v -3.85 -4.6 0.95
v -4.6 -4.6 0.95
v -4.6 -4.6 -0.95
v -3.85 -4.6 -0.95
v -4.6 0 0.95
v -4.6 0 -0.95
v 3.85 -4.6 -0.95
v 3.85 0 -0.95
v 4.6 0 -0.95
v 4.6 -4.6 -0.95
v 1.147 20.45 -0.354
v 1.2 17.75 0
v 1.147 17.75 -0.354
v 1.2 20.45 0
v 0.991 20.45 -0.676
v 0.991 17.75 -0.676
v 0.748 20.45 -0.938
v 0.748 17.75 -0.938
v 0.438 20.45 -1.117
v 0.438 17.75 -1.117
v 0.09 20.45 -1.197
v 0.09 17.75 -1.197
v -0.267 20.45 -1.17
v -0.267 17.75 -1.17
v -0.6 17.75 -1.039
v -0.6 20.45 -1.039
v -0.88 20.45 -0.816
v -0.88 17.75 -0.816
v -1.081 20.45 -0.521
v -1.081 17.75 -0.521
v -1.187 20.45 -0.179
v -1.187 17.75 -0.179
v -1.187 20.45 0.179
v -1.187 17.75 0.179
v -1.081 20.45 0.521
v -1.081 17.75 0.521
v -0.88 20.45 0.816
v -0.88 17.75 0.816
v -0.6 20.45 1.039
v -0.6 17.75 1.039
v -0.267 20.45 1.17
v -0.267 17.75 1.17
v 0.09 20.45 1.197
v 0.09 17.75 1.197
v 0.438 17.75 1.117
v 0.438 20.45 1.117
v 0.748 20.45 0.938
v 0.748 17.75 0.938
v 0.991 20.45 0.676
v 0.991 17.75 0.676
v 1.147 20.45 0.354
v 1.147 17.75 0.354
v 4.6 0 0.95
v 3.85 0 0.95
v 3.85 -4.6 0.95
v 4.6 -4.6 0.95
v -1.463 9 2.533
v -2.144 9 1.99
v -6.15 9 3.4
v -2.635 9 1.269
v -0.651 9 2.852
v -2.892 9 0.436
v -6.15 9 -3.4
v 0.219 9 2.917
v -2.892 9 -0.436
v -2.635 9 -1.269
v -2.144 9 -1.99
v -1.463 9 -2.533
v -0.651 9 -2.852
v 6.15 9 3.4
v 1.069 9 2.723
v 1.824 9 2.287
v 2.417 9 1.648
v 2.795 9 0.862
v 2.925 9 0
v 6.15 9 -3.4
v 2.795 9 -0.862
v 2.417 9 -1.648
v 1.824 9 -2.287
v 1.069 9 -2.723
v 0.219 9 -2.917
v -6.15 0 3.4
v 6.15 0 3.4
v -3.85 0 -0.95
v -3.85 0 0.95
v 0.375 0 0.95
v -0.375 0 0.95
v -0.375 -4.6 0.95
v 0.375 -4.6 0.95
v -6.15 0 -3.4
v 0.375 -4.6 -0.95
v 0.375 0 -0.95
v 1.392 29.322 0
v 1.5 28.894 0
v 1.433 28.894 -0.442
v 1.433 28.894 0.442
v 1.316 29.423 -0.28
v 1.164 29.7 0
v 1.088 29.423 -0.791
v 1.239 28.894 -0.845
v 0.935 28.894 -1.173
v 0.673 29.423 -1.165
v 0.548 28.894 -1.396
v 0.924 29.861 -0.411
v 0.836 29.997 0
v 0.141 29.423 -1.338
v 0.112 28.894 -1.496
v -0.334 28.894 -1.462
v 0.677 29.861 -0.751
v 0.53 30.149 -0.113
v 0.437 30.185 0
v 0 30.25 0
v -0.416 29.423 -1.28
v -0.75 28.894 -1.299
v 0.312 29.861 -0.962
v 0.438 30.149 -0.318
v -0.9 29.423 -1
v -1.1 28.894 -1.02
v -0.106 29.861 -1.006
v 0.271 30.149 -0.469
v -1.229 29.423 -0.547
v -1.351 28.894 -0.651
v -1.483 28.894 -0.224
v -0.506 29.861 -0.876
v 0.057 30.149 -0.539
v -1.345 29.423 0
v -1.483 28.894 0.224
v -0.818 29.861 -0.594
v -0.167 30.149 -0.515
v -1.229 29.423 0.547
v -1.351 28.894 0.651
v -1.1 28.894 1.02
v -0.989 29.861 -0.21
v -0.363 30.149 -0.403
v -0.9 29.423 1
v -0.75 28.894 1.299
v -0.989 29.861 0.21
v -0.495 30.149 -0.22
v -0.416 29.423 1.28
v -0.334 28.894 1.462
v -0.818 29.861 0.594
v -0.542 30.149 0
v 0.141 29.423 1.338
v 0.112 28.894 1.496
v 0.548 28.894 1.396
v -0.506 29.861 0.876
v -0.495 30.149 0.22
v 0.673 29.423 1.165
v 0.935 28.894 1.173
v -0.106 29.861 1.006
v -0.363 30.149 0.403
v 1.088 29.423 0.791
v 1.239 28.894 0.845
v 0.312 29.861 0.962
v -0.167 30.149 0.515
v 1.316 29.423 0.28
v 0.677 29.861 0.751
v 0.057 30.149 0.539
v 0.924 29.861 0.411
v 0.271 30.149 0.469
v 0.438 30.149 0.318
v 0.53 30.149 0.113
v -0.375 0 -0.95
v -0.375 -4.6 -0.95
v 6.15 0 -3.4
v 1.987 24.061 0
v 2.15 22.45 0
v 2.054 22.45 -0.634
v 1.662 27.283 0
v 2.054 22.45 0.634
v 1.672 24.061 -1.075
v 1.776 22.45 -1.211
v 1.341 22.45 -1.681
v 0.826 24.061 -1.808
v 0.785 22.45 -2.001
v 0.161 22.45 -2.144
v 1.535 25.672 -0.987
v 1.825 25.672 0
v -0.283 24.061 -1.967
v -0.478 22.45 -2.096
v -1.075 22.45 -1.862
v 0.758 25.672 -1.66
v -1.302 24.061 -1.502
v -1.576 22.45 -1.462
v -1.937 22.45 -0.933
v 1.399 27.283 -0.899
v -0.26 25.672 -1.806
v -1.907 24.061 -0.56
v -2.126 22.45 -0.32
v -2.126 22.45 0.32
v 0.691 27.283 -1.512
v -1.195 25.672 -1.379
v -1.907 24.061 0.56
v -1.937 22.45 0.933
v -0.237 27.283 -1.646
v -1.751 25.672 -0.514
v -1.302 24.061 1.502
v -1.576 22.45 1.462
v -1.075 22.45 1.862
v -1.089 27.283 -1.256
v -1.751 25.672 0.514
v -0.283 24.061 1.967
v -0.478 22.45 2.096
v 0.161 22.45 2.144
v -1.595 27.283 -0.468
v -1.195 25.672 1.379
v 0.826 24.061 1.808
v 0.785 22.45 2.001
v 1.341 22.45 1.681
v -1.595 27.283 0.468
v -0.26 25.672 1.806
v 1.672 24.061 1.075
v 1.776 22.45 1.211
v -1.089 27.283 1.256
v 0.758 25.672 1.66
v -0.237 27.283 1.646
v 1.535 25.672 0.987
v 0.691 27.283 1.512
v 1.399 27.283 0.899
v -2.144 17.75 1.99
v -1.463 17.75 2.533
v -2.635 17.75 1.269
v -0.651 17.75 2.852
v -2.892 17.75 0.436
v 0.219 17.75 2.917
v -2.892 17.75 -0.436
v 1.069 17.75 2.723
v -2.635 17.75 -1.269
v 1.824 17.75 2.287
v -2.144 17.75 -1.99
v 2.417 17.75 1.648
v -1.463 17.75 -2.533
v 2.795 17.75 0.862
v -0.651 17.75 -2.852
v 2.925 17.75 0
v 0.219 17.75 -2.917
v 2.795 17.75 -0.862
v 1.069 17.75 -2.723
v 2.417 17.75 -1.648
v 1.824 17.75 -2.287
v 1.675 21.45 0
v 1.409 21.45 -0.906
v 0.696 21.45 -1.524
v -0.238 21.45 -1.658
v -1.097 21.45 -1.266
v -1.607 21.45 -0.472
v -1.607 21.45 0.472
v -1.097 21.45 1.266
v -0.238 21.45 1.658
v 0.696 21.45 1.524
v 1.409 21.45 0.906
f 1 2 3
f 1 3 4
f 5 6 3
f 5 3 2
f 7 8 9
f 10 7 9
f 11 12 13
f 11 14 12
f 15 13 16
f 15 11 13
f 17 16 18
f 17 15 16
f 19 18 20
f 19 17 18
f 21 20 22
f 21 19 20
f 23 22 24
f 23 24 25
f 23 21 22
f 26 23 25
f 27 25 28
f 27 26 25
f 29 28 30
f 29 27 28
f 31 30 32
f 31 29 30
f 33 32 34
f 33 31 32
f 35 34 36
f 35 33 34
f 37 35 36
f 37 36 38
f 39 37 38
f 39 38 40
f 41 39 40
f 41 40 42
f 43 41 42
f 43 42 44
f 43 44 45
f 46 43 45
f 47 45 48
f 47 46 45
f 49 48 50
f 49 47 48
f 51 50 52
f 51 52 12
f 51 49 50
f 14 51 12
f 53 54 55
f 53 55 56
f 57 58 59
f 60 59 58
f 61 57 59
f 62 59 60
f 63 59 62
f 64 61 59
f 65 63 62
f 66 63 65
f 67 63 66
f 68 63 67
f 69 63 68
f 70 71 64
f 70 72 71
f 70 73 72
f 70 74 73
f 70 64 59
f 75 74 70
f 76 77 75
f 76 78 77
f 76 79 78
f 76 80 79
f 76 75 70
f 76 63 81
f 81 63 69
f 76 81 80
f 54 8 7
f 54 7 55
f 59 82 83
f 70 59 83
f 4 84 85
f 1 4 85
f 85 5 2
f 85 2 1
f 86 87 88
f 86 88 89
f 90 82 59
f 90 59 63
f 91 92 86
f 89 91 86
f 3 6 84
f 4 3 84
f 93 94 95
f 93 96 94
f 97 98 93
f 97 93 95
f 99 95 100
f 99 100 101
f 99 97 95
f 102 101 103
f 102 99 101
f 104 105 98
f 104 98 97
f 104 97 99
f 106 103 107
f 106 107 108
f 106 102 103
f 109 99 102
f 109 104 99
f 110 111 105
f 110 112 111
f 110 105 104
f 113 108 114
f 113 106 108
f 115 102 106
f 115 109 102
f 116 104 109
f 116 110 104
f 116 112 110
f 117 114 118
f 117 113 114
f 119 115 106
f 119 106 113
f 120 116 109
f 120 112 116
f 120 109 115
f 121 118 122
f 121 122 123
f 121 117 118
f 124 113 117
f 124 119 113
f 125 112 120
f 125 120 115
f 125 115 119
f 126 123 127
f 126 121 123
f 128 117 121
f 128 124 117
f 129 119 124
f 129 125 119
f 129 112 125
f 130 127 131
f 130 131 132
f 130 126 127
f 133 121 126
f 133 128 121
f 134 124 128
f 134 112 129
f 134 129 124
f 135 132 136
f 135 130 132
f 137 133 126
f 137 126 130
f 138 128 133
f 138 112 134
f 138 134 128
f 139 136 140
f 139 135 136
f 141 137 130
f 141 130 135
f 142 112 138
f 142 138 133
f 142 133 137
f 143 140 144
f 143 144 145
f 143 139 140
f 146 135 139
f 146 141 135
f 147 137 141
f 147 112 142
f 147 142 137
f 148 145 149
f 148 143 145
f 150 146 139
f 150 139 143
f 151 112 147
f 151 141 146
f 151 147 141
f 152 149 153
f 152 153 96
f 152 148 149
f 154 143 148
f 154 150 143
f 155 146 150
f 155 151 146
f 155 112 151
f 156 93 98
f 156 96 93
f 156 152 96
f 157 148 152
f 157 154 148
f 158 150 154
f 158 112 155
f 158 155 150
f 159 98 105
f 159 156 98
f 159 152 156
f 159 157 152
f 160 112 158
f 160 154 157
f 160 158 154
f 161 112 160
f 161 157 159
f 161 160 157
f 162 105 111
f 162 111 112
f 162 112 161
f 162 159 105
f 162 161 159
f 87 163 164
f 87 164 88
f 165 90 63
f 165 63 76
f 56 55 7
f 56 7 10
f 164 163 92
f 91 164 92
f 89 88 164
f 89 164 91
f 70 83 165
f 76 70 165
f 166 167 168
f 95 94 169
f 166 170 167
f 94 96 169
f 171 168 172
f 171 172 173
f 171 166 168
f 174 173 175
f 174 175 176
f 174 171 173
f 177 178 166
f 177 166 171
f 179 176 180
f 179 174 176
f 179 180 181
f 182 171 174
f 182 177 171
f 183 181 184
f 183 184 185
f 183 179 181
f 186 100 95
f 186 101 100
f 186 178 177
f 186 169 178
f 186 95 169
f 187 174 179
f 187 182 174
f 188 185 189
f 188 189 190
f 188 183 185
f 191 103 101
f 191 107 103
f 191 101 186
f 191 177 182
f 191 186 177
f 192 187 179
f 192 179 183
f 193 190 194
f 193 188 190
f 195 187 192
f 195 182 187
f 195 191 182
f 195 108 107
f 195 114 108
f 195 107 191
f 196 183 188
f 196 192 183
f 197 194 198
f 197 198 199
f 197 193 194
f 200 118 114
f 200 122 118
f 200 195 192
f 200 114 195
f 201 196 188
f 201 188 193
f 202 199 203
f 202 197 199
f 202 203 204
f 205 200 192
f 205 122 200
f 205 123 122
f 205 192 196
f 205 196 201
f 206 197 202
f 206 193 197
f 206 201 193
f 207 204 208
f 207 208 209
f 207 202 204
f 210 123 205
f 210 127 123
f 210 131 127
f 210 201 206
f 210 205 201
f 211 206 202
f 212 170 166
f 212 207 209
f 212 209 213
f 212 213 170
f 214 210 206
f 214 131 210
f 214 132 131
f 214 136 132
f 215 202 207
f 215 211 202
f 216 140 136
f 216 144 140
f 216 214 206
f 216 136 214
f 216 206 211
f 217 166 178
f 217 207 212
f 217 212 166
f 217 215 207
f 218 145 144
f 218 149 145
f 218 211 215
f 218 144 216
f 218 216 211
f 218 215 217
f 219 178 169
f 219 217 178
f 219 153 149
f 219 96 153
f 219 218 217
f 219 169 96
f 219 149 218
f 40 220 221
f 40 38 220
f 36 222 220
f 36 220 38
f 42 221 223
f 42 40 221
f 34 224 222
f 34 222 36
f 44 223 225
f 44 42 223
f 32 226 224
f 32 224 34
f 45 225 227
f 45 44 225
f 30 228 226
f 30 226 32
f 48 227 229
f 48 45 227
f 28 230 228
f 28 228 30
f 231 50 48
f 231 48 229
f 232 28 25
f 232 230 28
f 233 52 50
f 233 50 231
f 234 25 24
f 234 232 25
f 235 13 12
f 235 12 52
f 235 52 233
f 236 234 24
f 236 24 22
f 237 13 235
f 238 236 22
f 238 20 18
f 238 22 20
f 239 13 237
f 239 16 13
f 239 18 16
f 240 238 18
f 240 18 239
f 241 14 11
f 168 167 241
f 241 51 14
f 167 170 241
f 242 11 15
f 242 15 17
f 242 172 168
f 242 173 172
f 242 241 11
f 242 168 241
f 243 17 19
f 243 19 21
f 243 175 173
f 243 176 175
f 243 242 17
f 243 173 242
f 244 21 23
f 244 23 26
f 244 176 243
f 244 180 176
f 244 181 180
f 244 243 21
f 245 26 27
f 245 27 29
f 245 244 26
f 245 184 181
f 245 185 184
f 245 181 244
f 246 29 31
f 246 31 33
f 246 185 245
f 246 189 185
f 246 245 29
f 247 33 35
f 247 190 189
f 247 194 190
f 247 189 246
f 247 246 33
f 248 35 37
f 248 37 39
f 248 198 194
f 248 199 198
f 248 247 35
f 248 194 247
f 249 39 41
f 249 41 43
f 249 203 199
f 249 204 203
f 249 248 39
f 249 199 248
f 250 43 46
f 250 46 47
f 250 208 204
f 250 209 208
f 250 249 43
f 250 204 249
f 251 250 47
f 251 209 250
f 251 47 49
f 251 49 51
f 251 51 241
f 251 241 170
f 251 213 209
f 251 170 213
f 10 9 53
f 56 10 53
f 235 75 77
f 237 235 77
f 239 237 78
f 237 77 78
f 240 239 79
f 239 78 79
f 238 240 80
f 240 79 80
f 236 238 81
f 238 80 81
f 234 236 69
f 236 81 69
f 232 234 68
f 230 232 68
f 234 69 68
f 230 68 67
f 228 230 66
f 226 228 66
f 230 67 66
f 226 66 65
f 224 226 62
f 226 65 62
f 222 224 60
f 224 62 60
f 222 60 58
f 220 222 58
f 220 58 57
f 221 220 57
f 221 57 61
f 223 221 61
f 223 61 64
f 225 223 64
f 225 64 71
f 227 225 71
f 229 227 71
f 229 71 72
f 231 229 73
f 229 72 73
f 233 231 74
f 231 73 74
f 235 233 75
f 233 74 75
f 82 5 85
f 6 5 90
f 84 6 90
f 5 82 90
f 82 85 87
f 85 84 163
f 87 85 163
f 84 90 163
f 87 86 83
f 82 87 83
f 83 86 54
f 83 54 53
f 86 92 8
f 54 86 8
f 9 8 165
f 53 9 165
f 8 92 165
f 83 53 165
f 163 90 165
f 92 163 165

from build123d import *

# Parameters (mm, degrees)
SKETCH1_W           = 12.3
SKETCH1_H           = 6.8
BOSS_EXTRUDE1_DEPTH = 9
SKETCH2_R           = 2.925
BOSS_EXTRUDE2_DEPTH = 8.75
SKETCH4_W           = 0.75
SKETCH4_H           = 1.9
BOSS_EXTRUDE3_DEPTH = 4.6


with BuildPart() as part:
    # Sketch1 → Boss-Extrude1 (new body)
    with BuildSketch(Plane(origin=(0, 0, 0), x_dir=(1, 0, 0), z_dir=(0, 1, 0))):
        Rectangle(SKETCH1_W, SKETCH1_H)
    extrude(amount=BOSS_EXTRUDE1_DEPTH)

    # Sketch2 → Boss-Extrude2 (add)
    with BuildSketch(Plane(origin=(0, 9, 0), x_dir=(1, 0, 0), z_dir=(0, 1, 0))):
        Circle(SKETCH2_R)
    extrude(amount=BOSS_EXTRUDE2_DEPTH)

    # Sketch3 → Revolve1 (revolve)
    with BuildSketch(Plane.XY):
        with BuildLine():
            Line((0, 17.75), (1.2, 17.75))
            Line((1.2, 17.75), (1.2, 20.45))
            Line((1.2, 20.45), (2.15, 22.45))
            Line((2.15, 22.45), (1.5, 28.893698303))
            ThreePointArc((1.5, 28.893698303), (1.011132322, 29.860648085), (0, 30.25))
            Line((0, 30.25), (0, 17.75))
        make_face()
    revolve(axis=Axis((0, -982.25, 0), (0, 1, 0)))

    # Sketch4 → Boss-Extrude3 (add)
    with BuildSketch(Plane.XZ):
        Rectangle(SKETCH4_W, SKETCH4_H)
        with Locations((-4.225, 0)):
            Rectangle(SKETCH4_W, SKETCH4_H)
        with Locations((4.225, 0)):
            Rectangle(SKETCH4_W, SKETCH4_H)
    extrude(amount=BOSS_EXTRUDE3_DEPTH)


solid = part.part
